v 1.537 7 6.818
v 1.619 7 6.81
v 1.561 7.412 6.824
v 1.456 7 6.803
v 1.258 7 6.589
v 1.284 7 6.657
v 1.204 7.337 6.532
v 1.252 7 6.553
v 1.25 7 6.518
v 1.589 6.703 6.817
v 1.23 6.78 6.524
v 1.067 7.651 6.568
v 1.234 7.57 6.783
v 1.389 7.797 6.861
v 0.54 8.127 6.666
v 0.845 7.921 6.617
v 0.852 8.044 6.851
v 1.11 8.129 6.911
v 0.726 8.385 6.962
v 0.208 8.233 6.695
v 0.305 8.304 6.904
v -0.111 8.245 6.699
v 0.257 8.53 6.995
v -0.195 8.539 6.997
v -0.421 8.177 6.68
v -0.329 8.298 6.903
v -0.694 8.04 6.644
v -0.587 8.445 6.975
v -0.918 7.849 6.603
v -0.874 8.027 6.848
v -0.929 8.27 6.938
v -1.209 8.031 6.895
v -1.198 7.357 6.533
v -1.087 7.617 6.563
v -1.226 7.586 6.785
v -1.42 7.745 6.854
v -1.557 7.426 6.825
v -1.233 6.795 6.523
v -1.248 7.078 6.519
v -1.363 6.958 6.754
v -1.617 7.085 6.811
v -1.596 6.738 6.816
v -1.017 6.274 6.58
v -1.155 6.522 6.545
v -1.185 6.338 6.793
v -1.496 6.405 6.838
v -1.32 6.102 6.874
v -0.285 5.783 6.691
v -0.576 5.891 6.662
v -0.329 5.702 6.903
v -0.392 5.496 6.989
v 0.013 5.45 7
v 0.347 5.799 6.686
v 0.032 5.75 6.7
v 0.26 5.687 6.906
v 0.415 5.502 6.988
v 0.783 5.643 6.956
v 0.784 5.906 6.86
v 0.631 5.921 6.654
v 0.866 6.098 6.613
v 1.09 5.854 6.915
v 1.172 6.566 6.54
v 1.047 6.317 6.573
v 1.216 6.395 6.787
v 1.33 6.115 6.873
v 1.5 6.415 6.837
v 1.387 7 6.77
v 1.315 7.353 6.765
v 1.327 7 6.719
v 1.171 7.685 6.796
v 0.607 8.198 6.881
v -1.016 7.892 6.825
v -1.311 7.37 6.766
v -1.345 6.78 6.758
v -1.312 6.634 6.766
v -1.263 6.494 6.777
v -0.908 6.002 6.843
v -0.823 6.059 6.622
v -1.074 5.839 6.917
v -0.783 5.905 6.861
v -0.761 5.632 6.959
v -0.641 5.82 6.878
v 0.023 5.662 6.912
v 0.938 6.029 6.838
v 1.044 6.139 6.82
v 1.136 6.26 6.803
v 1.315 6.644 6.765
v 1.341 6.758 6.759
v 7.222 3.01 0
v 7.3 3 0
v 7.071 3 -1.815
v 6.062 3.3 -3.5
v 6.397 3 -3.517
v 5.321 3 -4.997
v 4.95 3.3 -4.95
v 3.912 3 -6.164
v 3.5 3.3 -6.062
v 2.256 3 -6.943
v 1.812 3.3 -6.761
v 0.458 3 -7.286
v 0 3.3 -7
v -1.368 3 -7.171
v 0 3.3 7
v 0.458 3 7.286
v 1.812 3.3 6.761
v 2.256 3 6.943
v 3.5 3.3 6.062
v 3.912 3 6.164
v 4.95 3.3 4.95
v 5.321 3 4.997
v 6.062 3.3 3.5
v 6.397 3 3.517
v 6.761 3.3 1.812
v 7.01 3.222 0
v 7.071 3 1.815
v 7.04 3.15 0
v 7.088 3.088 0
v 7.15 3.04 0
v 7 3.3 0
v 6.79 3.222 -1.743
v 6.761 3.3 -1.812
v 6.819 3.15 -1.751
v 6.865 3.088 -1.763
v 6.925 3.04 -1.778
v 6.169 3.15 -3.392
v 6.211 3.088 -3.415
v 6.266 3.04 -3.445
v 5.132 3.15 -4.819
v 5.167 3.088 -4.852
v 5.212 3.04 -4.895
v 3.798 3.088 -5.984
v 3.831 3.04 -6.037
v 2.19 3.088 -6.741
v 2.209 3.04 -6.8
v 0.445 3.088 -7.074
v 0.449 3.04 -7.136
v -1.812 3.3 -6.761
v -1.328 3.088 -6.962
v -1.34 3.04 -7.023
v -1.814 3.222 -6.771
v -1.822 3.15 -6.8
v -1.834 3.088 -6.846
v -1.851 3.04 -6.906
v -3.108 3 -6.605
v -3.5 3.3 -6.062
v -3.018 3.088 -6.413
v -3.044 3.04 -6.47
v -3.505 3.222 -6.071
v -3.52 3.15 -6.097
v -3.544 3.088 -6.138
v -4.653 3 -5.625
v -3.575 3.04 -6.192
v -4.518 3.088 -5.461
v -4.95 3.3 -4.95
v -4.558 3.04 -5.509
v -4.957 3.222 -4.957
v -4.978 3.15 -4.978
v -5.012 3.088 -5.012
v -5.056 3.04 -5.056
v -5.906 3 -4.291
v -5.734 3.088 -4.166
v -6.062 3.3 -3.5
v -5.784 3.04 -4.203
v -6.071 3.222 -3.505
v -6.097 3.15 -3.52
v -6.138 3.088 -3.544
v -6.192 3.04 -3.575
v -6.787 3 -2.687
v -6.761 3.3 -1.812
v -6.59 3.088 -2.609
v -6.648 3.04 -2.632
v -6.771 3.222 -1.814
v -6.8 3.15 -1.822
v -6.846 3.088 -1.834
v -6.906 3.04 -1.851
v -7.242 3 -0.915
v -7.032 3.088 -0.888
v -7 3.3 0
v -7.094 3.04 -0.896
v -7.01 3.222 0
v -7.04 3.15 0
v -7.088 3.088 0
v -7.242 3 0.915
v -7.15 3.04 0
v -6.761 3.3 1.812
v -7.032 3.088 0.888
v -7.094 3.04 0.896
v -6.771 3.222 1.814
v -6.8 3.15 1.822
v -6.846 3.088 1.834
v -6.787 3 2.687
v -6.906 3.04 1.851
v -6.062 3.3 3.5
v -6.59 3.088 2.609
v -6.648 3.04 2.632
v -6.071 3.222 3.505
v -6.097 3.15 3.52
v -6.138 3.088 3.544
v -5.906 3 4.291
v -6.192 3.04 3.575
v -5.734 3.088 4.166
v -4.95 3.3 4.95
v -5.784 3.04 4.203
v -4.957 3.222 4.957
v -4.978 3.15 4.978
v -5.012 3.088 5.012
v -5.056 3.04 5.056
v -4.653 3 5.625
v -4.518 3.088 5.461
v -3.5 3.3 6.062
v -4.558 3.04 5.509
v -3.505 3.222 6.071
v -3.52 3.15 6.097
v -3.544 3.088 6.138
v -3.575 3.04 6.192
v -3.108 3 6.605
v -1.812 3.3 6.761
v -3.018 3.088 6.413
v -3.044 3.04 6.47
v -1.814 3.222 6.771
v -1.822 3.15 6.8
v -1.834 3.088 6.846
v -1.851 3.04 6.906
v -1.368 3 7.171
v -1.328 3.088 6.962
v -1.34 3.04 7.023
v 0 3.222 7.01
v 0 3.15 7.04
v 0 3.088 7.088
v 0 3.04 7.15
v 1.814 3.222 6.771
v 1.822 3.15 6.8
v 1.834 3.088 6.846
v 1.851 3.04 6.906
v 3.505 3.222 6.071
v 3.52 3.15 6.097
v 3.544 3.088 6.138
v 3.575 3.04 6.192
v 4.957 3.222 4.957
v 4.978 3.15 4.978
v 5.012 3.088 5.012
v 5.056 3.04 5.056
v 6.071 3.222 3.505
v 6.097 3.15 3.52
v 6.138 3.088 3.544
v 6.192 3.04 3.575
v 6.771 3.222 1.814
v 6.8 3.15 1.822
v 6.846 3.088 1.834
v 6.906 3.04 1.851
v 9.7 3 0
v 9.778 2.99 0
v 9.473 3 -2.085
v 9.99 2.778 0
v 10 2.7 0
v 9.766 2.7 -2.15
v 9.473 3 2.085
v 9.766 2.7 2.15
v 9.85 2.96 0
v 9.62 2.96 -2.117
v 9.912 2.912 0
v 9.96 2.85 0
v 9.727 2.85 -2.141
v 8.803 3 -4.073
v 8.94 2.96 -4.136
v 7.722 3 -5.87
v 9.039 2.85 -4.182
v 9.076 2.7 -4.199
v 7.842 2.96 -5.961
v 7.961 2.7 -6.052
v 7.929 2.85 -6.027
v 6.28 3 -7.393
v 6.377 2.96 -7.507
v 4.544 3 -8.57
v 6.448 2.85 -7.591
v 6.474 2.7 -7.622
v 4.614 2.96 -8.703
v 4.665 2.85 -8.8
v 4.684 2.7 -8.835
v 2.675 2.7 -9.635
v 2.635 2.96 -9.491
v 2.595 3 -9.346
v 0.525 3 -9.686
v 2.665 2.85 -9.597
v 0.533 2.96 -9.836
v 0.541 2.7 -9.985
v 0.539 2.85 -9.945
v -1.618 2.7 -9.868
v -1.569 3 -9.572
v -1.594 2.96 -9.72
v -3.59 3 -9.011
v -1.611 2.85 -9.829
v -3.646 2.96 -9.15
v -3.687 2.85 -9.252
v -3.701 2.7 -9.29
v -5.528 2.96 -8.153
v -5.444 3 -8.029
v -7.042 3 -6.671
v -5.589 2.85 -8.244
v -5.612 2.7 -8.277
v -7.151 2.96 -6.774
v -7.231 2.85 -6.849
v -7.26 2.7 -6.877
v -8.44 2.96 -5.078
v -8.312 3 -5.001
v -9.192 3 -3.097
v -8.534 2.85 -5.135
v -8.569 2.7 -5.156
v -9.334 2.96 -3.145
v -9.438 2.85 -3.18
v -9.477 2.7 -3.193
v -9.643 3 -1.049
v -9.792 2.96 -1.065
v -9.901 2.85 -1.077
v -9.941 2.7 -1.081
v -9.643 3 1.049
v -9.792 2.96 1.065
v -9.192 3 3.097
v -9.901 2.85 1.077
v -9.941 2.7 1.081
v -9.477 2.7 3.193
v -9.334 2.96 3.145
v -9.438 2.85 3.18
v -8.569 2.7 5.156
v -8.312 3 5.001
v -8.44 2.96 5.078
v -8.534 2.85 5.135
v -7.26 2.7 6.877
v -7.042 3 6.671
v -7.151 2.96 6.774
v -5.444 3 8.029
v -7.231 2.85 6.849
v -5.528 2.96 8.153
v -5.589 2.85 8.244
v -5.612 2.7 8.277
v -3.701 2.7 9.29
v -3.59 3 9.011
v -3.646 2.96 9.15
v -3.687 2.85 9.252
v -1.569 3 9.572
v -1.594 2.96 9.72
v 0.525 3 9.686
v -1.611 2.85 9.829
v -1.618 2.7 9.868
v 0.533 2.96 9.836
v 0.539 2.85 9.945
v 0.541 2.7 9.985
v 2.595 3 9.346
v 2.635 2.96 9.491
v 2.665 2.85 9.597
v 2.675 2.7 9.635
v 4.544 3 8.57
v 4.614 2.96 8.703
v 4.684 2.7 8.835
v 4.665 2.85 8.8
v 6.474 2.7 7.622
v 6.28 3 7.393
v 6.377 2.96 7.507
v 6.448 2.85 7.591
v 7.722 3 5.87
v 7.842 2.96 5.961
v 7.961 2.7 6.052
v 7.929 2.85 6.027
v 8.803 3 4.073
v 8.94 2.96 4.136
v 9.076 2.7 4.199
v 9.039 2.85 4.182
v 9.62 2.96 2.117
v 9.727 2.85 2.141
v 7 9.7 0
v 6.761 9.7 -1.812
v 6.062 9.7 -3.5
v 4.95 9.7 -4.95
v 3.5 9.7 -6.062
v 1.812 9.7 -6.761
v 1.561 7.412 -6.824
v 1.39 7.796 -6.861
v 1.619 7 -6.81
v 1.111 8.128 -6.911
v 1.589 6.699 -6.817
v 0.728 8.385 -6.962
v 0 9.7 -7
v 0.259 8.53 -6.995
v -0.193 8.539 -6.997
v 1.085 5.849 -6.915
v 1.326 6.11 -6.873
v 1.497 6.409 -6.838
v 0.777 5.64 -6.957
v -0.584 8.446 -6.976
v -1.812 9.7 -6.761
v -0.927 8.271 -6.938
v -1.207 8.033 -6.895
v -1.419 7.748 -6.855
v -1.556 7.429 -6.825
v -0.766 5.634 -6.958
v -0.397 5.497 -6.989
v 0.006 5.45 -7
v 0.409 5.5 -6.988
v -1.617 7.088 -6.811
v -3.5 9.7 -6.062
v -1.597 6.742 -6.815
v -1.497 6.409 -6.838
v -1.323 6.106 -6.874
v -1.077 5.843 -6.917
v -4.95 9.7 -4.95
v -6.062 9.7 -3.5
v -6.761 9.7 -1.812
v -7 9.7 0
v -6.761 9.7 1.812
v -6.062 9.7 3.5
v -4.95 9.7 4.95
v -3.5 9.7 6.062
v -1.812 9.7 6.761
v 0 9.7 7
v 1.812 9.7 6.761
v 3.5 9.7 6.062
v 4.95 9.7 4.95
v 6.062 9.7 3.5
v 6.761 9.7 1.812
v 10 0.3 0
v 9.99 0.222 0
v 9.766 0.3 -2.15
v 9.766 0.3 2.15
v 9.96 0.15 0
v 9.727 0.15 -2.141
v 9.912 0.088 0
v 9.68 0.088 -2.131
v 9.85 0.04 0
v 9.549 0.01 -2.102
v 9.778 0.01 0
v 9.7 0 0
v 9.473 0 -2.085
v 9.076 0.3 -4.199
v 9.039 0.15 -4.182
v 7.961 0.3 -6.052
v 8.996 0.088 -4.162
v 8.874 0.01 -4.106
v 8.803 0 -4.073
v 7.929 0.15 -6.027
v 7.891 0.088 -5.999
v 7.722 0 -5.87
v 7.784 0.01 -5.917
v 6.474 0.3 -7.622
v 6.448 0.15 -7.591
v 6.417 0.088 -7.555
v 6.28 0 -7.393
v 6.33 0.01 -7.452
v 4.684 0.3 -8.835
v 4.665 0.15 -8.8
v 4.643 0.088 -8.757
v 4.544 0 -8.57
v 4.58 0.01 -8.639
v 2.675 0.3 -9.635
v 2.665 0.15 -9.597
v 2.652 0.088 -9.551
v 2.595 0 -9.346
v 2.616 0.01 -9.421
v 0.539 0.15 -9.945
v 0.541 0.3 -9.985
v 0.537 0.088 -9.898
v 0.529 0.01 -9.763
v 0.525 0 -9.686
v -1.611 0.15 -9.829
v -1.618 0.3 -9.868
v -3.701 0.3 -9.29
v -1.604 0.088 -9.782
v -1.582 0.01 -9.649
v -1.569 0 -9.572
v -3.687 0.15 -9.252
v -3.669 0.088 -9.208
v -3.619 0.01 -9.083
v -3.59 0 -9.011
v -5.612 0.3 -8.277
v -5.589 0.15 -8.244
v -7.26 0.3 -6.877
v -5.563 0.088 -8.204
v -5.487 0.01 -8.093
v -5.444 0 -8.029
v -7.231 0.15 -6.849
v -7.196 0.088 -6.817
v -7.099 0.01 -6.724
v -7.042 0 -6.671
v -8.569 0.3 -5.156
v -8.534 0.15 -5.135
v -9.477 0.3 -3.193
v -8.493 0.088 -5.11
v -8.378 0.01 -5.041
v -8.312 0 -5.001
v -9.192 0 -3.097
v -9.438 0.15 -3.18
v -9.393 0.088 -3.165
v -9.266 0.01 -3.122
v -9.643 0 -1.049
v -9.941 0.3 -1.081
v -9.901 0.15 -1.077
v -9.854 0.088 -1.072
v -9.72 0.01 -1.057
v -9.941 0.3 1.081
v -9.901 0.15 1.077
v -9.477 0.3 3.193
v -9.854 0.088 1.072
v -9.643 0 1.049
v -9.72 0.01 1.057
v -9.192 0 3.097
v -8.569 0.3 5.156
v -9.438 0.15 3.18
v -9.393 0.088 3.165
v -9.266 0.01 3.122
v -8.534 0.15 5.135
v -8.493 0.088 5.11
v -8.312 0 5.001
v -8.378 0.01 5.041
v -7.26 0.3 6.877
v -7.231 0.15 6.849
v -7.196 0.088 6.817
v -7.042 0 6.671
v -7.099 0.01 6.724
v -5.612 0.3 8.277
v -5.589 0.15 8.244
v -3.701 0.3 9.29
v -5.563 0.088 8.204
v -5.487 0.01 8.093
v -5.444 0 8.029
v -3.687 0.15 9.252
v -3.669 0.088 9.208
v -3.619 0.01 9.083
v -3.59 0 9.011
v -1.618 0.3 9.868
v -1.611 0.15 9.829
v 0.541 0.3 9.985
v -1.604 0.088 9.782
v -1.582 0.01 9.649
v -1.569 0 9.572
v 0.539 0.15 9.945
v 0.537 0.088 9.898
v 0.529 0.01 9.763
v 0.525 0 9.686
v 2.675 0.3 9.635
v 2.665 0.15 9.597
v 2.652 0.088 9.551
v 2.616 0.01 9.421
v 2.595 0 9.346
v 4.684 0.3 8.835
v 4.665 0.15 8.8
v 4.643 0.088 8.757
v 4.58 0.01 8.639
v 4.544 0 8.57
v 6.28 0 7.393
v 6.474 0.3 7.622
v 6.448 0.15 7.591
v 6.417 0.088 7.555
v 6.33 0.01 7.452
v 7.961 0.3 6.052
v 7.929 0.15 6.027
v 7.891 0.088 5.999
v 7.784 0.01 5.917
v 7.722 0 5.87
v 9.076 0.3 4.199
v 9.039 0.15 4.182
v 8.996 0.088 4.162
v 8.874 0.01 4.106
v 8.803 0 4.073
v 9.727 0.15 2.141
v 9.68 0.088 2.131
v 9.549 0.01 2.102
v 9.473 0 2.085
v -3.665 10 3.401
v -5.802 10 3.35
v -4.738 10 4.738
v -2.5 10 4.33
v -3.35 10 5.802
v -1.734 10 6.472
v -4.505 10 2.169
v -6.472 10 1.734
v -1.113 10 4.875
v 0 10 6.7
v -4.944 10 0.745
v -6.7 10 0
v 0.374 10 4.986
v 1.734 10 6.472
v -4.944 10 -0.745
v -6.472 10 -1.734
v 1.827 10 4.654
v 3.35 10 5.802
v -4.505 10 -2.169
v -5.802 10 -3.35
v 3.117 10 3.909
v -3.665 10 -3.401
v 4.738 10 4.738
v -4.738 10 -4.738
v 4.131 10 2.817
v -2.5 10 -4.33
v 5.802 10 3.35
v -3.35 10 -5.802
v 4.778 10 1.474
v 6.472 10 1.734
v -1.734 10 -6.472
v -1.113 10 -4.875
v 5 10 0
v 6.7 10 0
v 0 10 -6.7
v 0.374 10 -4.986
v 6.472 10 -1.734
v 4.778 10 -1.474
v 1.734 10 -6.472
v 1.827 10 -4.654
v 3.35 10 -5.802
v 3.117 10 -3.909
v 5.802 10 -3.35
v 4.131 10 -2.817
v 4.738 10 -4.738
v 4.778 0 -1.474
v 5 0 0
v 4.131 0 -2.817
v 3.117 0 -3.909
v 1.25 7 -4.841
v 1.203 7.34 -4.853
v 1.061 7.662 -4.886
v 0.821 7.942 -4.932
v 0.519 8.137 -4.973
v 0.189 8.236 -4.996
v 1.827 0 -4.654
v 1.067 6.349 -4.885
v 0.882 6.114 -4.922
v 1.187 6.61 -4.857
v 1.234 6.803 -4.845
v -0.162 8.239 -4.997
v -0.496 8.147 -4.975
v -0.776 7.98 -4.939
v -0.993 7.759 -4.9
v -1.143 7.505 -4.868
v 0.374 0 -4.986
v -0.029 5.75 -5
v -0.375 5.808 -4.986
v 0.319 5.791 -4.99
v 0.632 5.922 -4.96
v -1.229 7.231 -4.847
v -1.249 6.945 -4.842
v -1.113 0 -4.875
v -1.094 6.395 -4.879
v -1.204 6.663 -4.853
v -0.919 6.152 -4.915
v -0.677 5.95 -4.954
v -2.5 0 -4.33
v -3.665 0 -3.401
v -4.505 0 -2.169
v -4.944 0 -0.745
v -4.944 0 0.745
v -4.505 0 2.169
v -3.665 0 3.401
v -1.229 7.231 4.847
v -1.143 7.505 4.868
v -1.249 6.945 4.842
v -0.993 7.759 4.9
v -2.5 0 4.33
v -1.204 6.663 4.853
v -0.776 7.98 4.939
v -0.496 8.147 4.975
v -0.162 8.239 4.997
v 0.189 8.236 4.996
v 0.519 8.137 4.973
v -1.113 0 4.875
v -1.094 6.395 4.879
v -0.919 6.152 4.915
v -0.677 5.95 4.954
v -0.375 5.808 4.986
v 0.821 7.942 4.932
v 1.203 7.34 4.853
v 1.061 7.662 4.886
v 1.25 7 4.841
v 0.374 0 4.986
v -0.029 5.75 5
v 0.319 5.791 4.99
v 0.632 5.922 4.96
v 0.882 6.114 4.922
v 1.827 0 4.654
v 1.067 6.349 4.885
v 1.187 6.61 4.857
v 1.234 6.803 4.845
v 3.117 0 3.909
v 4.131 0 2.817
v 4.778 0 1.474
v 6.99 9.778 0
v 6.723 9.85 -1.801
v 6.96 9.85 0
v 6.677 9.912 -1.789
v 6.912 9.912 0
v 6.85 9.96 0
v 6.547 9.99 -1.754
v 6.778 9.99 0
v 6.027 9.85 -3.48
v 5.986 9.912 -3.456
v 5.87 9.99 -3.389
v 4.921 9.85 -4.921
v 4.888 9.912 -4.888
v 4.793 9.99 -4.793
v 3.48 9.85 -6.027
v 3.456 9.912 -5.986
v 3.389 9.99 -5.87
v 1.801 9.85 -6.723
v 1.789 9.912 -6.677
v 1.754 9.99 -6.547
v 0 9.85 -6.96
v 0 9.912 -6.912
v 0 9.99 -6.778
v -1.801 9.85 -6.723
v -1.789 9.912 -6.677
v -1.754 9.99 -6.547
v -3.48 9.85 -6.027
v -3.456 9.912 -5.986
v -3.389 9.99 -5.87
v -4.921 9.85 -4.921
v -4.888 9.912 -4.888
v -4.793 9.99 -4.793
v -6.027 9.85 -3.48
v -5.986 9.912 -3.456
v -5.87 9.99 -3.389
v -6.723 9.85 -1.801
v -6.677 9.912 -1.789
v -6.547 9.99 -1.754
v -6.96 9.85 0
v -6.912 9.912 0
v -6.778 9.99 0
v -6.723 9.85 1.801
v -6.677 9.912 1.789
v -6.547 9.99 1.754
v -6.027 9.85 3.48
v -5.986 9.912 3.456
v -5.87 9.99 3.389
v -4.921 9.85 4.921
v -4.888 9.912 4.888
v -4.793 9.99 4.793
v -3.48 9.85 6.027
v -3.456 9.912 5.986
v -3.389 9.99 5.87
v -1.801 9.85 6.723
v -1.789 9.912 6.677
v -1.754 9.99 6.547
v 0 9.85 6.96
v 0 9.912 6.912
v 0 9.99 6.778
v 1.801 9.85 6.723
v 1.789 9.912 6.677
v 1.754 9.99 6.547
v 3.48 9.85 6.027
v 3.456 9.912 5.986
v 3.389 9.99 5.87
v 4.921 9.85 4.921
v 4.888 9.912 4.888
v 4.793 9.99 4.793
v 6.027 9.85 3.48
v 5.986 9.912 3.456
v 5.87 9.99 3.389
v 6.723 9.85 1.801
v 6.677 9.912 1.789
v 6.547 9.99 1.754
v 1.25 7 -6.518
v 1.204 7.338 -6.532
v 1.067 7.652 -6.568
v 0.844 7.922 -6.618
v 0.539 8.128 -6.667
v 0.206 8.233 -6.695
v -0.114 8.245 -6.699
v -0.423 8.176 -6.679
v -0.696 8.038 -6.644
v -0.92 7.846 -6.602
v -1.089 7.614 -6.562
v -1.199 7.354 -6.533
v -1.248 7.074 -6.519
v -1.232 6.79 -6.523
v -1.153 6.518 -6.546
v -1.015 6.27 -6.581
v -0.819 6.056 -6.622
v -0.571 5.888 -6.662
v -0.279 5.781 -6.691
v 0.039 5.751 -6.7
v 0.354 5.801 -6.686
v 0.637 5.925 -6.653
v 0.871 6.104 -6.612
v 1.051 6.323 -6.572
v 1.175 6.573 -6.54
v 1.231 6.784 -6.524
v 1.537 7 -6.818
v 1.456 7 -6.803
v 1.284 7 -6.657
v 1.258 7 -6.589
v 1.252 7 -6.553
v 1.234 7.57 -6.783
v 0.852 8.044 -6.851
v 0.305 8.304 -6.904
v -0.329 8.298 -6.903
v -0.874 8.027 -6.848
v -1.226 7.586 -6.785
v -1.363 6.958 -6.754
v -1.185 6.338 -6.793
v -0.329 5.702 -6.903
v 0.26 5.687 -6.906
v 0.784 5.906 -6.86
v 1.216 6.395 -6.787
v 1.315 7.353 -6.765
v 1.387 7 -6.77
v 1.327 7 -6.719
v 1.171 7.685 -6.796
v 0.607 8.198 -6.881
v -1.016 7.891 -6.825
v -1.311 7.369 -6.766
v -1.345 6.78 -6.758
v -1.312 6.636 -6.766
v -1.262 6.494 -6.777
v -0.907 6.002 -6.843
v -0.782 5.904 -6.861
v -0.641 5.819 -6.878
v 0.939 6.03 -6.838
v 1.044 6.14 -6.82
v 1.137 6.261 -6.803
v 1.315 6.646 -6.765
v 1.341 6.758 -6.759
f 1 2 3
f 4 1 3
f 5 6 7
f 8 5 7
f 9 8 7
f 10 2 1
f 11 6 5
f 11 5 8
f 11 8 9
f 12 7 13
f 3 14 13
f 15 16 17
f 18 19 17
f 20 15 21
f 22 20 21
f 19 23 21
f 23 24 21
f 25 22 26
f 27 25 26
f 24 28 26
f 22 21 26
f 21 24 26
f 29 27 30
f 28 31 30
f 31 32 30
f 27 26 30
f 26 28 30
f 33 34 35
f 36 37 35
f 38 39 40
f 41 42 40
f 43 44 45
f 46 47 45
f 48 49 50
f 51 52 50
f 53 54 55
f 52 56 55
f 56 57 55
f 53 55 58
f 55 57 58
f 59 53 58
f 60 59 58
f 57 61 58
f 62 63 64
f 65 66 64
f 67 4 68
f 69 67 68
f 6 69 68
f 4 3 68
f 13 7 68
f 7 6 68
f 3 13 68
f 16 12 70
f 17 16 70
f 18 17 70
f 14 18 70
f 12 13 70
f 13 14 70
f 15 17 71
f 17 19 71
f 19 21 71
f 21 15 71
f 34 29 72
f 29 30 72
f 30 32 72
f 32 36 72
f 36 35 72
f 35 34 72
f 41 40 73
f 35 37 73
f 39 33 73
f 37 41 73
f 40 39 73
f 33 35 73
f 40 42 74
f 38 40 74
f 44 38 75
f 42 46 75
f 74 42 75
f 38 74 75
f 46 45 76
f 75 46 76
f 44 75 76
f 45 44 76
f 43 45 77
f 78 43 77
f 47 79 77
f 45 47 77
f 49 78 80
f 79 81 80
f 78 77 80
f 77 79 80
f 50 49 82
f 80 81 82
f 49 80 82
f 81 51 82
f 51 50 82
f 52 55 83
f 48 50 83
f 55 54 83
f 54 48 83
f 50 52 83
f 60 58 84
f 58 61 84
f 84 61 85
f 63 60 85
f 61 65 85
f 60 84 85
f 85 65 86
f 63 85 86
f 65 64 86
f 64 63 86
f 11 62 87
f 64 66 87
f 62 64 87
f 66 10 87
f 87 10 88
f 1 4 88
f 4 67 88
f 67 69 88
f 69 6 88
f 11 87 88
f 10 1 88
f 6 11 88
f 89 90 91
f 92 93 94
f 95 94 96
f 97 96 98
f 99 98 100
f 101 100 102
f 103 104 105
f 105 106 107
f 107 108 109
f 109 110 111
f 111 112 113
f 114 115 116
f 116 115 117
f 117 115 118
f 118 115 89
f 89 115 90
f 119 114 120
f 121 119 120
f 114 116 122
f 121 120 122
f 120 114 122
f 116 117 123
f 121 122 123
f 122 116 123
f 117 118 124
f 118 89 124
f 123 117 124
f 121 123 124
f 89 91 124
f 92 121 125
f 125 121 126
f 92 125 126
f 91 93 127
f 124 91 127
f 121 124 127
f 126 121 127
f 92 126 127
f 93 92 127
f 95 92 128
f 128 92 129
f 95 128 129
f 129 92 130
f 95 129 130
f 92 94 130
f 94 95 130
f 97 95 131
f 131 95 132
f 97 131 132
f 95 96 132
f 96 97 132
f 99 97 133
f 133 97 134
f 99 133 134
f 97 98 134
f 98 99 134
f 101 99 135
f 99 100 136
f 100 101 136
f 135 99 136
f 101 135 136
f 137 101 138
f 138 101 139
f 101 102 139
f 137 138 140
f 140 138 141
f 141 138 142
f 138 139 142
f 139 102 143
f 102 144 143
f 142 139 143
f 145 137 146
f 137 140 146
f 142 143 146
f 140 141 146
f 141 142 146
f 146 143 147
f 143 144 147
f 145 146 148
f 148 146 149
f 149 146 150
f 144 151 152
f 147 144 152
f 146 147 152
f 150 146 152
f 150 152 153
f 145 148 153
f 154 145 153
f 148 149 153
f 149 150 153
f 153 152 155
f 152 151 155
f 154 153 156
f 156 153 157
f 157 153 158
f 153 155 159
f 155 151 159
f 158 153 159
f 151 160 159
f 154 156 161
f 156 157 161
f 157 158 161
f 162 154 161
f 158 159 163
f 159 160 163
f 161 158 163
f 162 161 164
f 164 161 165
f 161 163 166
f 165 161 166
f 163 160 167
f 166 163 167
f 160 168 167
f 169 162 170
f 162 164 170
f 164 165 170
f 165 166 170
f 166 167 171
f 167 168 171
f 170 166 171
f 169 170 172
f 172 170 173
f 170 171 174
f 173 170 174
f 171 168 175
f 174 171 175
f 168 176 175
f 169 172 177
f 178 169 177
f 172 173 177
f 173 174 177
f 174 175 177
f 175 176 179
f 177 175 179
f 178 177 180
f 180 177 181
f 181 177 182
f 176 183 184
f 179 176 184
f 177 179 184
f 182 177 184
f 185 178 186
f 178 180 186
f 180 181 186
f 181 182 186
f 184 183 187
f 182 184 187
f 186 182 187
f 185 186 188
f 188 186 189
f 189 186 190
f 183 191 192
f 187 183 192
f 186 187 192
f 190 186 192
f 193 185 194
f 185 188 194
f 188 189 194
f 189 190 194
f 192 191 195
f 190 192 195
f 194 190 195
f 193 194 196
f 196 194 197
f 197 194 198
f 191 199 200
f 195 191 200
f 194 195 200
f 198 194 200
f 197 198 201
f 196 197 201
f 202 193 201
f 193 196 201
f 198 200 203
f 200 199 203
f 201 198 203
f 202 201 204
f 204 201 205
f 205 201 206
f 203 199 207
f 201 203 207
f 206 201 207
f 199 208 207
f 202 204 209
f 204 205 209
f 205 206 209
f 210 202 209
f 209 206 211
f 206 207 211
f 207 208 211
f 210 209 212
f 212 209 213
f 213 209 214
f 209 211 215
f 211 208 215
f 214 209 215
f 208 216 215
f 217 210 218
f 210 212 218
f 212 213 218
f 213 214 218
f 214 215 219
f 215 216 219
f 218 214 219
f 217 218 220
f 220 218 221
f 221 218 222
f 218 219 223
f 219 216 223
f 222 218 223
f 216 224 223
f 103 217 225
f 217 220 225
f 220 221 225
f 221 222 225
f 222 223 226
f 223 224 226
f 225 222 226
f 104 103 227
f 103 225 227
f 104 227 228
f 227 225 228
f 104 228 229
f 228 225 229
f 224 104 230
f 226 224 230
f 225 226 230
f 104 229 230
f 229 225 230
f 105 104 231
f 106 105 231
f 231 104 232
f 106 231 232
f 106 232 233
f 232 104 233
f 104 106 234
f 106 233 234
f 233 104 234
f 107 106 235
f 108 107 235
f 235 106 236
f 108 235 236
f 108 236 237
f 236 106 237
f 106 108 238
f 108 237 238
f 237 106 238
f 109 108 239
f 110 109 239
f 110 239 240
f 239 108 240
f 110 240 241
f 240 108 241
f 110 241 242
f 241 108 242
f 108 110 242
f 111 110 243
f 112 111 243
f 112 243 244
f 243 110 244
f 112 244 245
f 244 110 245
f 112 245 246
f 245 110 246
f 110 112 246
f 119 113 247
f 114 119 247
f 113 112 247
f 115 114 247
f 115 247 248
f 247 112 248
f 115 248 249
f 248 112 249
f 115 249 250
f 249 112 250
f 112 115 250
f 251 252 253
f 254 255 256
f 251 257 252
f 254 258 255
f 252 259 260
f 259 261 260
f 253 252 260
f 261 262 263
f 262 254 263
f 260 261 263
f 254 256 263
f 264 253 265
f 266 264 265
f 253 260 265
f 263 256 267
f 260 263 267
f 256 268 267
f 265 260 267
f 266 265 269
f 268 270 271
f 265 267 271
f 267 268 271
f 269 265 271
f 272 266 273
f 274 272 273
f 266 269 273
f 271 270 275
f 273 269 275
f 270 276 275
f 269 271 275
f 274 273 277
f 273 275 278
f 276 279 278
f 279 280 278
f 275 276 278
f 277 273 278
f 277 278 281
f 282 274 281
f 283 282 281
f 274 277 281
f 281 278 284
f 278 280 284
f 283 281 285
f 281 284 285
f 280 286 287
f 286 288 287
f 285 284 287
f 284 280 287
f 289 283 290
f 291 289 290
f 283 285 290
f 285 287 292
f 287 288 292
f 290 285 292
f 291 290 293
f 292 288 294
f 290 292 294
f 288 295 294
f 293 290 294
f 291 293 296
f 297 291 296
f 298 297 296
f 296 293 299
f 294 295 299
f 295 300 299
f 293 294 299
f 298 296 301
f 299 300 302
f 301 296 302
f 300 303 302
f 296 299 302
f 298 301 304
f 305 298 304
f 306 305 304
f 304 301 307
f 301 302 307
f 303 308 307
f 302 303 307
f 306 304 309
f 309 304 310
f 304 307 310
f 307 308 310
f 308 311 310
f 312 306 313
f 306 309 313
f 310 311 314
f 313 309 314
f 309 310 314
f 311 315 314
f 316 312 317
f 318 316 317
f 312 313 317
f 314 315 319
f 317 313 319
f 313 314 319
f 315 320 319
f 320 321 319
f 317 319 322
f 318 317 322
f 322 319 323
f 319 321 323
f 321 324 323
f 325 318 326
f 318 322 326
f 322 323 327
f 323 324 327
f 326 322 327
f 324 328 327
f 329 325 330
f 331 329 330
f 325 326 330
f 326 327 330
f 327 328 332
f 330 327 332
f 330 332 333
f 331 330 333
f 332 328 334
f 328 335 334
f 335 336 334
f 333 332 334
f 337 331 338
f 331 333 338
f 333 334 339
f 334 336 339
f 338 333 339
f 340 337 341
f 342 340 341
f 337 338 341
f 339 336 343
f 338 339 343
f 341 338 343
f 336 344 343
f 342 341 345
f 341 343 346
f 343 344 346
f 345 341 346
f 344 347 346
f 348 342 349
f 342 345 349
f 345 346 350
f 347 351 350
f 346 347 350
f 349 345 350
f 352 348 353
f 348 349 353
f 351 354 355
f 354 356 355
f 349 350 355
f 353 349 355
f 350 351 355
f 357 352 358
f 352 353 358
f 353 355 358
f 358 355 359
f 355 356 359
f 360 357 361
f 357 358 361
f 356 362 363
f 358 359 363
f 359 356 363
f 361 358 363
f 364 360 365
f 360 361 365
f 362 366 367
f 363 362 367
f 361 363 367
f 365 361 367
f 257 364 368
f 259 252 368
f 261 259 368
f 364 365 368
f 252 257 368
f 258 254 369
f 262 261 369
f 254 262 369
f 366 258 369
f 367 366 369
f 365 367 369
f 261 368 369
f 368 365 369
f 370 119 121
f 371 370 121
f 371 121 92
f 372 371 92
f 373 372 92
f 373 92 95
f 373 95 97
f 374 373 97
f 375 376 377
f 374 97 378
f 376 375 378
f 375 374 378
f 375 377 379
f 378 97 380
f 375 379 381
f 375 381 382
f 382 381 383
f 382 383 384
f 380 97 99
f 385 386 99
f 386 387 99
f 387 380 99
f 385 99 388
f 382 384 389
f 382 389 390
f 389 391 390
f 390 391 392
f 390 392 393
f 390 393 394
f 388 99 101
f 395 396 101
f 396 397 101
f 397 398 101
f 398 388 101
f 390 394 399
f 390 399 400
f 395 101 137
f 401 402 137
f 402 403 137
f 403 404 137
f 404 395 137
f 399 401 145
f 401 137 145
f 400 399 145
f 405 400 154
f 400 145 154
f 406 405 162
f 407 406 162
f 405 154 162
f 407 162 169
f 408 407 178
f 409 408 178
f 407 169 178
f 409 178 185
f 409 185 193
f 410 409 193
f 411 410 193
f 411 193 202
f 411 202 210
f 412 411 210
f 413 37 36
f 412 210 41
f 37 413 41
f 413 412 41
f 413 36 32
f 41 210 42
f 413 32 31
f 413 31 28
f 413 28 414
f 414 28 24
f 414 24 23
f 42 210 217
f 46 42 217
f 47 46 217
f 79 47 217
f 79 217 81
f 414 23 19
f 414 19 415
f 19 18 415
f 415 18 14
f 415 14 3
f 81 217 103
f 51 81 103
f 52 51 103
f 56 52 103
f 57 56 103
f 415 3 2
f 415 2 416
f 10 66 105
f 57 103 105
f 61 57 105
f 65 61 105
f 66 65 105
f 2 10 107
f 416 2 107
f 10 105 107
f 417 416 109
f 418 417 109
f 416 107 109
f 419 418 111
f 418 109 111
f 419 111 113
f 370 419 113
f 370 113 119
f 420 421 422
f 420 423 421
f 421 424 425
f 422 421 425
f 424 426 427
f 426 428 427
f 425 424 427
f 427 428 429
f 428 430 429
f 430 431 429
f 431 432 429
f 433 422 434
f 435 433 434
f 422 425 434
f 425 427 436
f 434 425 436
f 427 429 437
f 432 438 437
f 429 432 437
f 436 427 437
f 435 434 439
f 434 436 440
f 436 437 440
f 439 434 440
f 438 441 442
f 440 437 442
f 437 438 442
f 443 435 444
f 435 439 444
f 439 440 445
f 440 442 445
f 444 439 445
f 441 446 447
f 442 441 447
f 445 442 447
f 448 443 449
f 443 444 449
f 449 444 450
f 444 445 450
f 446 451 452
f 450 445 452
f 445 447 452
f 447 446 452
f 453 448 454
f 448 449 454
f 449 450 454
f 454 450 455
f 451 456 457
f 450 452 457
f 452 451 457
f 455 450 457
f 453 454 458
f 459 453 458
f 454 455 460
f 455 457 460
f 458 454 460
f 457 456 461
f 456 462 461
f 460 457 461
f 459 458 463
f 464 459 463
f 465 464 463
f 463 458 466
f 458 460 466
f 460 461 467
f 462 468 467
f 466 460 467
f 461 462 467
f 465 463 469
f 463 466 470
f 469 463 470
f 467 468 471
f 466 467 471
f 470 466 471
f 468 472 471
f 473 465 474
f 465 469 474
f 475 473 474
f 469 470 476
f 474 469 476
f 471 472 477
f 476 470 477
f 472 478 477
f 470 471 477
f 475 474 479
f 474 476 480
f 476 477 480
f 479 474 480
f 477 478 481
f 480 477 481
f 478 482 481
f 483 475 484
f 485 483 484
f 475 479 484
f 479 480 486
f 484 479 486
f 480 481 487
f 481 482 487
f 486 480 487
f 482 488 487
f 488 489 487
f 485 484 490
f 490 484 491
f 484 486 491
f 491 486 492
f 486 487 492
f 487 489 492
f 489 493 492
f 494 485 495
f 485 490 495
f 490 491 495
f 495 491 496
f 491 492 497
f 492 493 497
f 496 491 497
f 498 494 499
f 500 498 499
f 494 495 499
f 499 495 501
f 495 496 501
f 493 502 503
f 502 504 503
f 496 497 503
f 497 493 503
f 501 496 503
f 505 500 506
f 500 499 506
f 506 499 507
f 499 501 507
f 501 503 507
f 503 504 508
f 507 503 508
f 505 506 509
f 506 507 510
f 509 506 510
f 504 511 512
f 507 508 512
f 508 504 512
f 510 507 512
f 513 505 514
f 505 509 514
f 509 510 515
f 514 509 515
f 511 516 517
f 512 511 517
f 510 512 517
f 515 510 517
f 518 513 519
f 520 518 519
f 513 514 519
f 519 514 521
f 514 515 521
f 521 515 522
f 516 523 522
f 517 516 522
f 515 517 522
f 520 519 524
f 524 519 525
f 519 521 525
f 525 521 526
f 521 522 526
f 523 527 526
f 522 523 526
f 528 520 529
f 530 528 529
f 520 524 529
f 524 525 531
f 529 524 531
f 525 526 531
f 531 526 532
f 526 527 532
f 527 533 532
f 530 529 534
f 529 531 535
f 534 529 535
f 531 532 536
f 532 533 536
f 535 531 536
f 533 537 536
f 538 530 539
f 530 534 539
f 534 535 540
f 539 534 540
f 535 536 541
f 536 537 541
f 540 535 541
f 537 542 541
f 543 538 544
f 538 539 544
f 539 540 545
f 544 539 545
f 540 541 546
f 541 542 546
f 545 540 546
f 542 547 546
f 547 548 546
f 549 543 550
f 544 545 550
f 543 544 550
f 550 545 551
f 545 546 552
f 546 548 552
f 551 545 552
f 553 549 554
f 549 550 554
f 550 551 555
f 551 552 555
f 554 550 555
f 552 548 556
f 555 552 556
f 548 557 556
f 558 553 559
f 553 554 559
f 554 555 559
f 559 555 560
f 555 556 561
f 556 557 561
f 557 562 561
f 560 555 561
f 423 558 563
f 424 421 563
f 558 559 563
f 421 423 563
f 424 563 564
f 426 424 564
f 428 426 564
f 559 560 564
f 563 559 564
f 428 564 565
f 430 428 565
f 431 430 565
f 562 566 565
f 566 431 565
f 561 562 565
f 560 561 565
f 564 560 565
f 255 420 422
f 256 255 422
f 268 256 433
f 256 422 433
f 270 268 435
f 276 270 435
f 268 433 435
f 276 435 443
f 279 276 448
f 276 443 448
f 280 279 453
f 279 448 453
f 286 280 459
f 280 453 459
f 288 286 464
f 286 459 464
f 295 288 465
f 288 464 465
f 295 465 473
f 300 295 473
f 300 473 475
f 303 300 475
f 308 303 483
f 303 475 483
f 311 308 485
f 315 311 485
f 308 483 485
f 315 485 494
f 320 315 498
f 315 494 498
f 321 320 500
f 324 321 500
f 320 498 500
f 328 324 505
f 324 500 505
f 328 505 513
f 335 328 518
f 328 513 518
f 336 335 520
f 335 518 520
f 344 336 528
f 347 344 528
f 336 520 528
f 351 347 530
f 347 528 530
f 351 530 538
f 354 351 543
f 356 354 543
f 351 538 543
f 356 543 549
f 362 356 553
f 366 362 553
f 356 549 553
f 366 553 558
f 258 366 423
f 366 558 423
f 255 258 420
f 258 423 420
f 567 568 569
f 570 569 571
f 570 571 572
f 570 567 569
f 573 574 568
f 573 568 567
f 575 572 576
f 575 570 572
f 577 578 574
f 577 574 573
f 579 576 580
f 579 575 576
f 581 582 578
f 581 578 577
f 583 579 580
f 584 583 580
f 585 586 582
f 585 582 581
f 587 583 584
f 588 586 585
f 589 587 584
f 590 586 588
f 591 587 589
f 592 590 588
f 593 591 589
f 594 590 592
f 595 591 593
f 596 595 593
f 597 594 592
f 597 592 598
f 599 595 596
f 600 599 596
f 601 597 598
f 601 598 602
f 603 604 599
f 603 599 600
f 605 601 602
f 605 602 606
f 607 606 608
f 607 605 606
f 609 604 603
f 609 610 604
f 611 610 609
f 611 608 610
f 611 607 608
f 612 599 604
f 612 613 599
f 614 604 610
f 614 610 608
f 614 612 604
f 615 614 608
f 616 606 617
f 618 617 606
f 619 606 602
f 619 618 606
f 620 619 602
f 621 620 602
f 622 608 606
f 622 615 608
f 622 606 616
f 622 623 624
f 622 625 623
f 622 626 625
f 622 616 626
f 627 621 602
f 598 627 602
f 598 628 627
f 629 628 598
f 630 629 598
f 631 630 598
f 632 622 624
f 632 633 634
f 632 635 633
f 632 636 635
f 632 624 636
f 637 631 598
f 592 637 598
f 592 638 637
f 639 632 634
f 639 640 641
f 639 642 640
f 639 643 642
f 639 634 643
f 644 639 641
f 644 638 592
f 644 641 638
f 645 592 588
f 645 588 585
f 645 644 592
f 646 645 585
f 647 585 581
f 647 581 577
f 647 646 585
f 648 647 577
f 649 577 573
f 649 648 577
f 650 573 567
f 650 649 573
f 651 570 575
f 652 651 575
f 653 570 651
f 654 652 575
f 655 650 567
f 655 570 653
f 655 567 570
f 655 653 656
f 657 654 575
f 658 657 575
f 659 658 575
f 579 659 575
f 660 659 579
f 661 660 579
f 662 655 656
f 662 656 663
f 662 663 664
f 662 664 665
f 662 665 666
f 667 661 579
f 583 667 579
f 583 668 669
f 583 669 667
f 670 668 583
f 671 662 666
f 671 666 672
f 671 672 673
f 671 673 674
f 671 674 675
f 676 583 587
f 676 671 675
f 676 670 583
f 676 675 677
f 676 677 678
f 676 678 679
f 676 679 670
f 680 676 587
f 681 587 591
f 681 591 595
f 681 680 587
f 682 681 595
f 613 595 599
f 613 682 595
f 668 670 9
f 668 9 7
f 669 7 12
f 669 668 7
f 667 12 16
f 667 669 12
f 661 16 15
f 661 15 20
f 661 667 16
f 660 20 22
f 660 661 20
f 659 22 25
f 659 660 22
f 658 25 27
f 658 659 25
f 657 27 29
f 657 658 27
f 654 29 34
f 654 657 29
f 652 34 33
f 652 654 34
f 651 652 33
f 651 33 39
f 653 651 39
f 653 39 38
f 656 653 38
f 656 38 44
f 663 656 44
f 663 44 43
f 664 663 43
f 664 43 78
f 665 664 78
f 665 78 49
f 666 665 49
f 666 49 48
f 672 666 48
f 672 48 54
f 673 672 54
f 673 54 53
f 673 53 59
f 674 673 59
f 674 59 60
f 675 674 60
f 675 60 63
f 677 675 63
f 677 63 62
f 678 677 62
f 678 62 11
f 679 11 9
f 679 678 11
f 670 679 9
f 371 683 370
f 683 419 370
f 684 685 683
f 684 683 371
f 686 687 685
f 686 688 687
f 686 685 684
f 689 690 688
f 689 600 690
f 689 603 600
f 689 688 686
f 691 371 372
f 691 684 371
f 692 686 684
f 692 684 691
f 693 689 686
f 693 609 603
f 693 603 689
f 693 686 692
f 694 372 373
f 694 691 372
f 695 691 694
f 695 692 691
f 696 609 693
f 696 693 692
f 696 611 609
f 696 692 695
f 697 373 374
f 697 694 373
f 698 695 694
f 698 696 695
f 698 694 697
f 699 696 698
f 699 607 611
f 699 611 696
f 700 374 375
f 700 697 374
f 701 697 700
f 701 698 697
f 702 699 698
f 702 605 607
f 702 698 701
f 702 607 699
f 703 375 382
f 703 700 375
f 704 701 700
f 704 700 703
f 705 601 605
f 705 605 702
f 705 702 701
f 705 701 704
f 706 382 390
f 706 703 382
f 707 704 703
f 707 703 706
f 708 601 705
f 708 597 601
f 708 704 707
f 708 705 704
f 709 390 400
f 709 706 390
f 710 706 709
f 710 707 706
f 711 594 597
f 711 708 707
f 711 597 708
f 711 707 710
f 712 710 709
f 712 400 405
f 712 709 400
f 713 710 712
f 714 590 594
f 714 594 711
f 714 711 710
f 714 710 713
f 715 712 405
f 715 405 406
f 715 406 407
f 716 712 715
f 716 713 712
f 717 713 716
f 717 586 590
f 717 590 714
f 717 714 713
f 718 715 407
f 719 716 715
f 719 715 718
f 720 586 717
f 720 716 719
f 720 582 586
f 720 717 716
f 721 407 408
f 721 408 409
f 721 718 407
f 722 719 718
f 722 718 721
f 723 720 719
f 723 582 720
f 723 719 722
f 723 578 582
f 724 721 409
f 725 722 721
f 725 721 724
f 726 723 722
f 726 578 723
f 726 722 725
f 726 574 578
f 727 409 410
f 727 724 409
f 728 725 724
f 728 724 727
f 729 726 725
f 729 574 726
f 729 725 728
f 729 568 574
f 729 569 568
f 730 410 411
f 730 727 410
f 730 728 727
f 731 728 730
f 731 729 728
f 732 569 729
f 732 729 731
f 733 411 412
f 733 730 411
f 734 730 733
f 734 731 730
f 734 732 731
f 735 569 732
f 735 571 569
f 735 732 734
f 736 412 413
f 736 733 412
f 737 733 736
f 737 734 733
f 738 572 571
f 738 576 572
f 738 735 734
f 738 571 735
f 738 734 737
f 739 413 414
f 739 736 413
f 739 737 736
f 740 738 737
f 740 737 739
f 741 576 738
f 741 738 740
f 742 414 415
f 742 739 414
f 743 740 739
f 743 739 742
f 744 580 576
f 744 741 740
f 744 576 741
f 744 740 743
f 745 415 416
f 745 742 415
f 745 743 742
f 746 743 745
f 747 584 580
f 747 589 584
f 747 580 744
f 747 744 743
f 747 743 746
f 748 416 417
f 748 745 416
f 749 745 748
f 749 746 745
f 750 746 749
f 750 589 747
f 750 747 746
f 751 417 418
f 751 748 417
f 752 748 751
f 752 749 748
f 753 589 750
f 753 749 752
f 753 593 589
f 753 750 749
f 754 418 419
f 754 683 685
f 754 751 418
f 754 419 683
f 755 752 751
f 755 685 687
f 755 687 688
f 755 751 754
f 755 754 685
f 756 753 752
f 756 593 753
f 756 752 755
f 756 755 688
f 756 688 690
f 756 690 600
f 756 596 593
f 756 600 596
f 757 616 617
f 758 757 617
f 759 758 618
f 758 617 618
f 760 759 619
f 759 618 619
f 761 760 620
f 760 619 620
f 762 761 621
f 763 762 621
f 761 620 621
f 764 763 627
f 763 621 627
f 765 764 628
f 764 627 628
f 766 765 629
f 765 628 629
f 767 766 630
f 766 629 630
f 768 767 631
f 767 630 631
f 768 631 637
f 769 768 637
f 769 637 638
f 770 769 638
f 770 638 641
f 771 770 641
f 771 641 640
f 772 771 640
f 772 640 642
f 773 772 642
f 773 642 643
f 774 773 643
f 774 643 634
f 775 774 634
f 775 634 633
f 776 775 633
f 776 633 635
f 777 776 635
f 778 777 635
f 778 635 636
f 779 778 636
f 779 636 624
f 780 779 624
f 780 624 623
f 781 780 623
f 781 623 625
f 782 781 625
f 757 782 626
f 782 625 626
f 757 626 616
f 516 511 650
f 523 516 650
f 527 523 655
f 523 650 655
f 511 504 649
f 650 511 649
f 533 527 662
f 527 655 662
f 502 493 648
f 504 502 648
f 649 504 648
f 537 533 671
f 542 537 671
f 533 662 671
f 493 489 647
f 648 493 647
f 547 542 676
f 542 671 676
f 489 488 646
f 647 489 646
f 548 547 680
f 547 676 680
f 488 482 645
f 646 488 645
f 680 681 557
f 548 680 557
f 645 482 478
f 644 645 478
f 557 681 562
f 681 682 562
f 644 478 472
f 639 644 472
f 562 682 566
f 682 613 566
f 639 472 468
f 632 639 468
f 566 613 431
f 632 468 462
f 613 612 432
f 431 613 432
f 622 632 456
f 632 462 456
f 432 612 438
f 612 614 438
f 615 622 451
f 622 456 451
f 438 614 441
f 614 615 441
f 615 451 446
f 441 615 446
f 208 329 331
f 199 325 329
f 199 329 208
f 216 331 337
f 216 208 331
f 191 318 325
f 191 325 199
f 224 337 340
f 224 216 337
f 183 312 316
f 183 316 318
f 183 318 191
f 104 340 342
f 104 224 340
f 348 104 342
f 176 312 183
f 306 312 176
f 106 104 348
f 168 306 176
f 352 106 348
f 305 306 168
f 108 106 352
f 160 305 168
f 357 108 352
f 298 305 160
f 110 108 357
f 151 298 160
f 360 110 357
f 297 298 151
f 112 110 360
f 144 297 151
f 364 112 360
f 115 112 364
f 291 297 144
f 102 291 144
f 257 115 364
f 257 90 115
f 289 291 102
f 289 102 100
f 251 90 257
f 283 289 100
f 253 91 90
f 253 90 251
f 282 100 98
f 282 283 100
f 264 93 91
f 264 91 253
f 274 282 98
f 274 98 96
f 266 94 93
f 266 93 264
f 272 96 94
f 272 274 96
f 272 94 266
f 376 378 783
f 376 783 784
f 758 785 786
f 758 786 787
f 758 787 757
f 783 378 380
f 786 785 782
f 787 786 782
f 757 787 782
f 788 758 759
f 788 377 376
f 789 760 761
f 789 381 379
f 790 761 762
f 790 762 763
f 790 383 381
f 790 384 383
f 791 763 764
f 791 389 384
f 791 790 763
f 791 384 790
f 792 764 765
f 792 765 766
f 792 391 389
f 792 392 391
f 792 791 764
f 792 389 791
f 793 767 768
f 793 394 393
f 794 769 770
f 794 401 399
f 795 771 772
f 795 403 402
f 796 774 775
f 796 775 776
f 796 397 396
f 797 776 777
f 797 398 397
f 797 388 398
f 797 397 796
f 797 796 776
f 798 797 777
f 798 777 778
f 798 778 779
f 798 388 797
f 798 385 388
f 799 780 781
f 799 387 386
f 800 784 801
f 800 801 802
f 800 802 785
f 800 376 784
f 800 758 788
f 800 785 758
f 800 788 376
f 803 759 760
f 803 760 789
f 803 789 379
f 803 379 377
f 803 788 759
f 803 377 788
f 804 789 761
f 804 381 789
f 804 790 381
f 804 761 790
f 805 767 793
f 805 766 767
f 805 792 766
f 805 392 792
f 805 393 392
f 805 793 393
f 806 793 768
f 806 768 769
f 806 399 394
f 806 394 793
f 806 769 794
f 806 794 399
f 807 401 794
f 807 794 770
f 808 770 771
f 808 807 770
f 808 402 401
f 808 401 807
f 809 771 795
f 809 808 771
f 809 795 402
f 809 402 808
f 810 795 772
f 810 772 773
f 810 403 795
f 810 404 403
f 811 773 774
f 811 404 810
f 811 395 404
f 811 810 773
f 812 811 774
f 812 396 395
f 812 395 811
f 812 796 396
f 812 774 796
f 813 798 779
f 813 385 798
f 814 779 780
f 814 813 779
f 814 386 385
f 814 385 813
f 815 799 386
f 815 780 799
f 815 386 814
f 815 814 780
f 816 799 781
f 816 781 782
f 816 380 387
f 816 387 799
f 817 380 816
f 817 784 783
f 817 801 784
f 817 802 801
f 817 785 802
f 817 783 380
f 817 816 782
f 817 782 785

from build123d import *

# Parameters (mm, degrees)
SKETCH1_R               = 10
SKETCH1_R_2             = 5
BOSS_EXTRUDE1_DEPTH     = 3
SKETCH2_R               = 7
SKETCH2_R_2             = 5
BOSS_EXTRUDE2_DEPTH     = 7
SKETCH3_R               = 1.25
CUT_EXTRUDE1_DEPTH      = 11
CUT_EXTRUDE1_DEPTH_BACK = 11
FILLET1_R               = 0.3


with BuildPart() as part:
    # Sketch1 → Boss-Extrude1 (new body)
    with BuildSketch(Plane(origin=(0, 0, 0), x_dir=(1, 0, 0), z_dir=(0, 1, 0))):
        Circle(SKETCH1_R)
        Circle(SKETCH1_R_2, mode=Mode.SUBTRACT)
    extrude(amount=BOSS_EXTRUDE1_DEPTH)

    # Sketch2 → Boss-Extrude2 (add)
    with BuildSketch(Plane(origin=(0, 3, 0), x_dir=(1, 0, 0), z_dir=(0, 1, 0))):
        Circle(SKETCH2_R)
        Circle(SKETCH2_R_2, mode=Mode.SUBTRACT)
    extrude(amount=BOSS_EXTRUDE2_DEPTH)

    # Sketch3 → Cut-Extrude1 (cut, two sides)
    with BuildSketch(Plane.XY) as cut_extrude1_sk:
        with Locations((0, 7)):
            Circle(SKETCH3_R)
    extrude(amount=CUT_EXTRUDE1_DEPTH, mode=Mode.SUBTRACT)
    extrude(cut_extrude1_sk.sketch, amount=-CUT_EXTRUDE1_DEPTH_BACK, mode=Mode.SUBTRACT)

    # Fillet1
    fillet1_edges = [part.edges().sort_by_distance(p)[0] for p in [
        (-7, 10, 0),
        (-7, 3, 0),
        (-1.250000002, 6.999999998, -6.887488659),
        (-1.250000002, 6.999999998, 6.887488659),
        (-10, 0, 0),
        (-10, 3, 0),
    ]]
    fillet(fillet1_edges, radius=FILLET1_R)


solid = part.part
